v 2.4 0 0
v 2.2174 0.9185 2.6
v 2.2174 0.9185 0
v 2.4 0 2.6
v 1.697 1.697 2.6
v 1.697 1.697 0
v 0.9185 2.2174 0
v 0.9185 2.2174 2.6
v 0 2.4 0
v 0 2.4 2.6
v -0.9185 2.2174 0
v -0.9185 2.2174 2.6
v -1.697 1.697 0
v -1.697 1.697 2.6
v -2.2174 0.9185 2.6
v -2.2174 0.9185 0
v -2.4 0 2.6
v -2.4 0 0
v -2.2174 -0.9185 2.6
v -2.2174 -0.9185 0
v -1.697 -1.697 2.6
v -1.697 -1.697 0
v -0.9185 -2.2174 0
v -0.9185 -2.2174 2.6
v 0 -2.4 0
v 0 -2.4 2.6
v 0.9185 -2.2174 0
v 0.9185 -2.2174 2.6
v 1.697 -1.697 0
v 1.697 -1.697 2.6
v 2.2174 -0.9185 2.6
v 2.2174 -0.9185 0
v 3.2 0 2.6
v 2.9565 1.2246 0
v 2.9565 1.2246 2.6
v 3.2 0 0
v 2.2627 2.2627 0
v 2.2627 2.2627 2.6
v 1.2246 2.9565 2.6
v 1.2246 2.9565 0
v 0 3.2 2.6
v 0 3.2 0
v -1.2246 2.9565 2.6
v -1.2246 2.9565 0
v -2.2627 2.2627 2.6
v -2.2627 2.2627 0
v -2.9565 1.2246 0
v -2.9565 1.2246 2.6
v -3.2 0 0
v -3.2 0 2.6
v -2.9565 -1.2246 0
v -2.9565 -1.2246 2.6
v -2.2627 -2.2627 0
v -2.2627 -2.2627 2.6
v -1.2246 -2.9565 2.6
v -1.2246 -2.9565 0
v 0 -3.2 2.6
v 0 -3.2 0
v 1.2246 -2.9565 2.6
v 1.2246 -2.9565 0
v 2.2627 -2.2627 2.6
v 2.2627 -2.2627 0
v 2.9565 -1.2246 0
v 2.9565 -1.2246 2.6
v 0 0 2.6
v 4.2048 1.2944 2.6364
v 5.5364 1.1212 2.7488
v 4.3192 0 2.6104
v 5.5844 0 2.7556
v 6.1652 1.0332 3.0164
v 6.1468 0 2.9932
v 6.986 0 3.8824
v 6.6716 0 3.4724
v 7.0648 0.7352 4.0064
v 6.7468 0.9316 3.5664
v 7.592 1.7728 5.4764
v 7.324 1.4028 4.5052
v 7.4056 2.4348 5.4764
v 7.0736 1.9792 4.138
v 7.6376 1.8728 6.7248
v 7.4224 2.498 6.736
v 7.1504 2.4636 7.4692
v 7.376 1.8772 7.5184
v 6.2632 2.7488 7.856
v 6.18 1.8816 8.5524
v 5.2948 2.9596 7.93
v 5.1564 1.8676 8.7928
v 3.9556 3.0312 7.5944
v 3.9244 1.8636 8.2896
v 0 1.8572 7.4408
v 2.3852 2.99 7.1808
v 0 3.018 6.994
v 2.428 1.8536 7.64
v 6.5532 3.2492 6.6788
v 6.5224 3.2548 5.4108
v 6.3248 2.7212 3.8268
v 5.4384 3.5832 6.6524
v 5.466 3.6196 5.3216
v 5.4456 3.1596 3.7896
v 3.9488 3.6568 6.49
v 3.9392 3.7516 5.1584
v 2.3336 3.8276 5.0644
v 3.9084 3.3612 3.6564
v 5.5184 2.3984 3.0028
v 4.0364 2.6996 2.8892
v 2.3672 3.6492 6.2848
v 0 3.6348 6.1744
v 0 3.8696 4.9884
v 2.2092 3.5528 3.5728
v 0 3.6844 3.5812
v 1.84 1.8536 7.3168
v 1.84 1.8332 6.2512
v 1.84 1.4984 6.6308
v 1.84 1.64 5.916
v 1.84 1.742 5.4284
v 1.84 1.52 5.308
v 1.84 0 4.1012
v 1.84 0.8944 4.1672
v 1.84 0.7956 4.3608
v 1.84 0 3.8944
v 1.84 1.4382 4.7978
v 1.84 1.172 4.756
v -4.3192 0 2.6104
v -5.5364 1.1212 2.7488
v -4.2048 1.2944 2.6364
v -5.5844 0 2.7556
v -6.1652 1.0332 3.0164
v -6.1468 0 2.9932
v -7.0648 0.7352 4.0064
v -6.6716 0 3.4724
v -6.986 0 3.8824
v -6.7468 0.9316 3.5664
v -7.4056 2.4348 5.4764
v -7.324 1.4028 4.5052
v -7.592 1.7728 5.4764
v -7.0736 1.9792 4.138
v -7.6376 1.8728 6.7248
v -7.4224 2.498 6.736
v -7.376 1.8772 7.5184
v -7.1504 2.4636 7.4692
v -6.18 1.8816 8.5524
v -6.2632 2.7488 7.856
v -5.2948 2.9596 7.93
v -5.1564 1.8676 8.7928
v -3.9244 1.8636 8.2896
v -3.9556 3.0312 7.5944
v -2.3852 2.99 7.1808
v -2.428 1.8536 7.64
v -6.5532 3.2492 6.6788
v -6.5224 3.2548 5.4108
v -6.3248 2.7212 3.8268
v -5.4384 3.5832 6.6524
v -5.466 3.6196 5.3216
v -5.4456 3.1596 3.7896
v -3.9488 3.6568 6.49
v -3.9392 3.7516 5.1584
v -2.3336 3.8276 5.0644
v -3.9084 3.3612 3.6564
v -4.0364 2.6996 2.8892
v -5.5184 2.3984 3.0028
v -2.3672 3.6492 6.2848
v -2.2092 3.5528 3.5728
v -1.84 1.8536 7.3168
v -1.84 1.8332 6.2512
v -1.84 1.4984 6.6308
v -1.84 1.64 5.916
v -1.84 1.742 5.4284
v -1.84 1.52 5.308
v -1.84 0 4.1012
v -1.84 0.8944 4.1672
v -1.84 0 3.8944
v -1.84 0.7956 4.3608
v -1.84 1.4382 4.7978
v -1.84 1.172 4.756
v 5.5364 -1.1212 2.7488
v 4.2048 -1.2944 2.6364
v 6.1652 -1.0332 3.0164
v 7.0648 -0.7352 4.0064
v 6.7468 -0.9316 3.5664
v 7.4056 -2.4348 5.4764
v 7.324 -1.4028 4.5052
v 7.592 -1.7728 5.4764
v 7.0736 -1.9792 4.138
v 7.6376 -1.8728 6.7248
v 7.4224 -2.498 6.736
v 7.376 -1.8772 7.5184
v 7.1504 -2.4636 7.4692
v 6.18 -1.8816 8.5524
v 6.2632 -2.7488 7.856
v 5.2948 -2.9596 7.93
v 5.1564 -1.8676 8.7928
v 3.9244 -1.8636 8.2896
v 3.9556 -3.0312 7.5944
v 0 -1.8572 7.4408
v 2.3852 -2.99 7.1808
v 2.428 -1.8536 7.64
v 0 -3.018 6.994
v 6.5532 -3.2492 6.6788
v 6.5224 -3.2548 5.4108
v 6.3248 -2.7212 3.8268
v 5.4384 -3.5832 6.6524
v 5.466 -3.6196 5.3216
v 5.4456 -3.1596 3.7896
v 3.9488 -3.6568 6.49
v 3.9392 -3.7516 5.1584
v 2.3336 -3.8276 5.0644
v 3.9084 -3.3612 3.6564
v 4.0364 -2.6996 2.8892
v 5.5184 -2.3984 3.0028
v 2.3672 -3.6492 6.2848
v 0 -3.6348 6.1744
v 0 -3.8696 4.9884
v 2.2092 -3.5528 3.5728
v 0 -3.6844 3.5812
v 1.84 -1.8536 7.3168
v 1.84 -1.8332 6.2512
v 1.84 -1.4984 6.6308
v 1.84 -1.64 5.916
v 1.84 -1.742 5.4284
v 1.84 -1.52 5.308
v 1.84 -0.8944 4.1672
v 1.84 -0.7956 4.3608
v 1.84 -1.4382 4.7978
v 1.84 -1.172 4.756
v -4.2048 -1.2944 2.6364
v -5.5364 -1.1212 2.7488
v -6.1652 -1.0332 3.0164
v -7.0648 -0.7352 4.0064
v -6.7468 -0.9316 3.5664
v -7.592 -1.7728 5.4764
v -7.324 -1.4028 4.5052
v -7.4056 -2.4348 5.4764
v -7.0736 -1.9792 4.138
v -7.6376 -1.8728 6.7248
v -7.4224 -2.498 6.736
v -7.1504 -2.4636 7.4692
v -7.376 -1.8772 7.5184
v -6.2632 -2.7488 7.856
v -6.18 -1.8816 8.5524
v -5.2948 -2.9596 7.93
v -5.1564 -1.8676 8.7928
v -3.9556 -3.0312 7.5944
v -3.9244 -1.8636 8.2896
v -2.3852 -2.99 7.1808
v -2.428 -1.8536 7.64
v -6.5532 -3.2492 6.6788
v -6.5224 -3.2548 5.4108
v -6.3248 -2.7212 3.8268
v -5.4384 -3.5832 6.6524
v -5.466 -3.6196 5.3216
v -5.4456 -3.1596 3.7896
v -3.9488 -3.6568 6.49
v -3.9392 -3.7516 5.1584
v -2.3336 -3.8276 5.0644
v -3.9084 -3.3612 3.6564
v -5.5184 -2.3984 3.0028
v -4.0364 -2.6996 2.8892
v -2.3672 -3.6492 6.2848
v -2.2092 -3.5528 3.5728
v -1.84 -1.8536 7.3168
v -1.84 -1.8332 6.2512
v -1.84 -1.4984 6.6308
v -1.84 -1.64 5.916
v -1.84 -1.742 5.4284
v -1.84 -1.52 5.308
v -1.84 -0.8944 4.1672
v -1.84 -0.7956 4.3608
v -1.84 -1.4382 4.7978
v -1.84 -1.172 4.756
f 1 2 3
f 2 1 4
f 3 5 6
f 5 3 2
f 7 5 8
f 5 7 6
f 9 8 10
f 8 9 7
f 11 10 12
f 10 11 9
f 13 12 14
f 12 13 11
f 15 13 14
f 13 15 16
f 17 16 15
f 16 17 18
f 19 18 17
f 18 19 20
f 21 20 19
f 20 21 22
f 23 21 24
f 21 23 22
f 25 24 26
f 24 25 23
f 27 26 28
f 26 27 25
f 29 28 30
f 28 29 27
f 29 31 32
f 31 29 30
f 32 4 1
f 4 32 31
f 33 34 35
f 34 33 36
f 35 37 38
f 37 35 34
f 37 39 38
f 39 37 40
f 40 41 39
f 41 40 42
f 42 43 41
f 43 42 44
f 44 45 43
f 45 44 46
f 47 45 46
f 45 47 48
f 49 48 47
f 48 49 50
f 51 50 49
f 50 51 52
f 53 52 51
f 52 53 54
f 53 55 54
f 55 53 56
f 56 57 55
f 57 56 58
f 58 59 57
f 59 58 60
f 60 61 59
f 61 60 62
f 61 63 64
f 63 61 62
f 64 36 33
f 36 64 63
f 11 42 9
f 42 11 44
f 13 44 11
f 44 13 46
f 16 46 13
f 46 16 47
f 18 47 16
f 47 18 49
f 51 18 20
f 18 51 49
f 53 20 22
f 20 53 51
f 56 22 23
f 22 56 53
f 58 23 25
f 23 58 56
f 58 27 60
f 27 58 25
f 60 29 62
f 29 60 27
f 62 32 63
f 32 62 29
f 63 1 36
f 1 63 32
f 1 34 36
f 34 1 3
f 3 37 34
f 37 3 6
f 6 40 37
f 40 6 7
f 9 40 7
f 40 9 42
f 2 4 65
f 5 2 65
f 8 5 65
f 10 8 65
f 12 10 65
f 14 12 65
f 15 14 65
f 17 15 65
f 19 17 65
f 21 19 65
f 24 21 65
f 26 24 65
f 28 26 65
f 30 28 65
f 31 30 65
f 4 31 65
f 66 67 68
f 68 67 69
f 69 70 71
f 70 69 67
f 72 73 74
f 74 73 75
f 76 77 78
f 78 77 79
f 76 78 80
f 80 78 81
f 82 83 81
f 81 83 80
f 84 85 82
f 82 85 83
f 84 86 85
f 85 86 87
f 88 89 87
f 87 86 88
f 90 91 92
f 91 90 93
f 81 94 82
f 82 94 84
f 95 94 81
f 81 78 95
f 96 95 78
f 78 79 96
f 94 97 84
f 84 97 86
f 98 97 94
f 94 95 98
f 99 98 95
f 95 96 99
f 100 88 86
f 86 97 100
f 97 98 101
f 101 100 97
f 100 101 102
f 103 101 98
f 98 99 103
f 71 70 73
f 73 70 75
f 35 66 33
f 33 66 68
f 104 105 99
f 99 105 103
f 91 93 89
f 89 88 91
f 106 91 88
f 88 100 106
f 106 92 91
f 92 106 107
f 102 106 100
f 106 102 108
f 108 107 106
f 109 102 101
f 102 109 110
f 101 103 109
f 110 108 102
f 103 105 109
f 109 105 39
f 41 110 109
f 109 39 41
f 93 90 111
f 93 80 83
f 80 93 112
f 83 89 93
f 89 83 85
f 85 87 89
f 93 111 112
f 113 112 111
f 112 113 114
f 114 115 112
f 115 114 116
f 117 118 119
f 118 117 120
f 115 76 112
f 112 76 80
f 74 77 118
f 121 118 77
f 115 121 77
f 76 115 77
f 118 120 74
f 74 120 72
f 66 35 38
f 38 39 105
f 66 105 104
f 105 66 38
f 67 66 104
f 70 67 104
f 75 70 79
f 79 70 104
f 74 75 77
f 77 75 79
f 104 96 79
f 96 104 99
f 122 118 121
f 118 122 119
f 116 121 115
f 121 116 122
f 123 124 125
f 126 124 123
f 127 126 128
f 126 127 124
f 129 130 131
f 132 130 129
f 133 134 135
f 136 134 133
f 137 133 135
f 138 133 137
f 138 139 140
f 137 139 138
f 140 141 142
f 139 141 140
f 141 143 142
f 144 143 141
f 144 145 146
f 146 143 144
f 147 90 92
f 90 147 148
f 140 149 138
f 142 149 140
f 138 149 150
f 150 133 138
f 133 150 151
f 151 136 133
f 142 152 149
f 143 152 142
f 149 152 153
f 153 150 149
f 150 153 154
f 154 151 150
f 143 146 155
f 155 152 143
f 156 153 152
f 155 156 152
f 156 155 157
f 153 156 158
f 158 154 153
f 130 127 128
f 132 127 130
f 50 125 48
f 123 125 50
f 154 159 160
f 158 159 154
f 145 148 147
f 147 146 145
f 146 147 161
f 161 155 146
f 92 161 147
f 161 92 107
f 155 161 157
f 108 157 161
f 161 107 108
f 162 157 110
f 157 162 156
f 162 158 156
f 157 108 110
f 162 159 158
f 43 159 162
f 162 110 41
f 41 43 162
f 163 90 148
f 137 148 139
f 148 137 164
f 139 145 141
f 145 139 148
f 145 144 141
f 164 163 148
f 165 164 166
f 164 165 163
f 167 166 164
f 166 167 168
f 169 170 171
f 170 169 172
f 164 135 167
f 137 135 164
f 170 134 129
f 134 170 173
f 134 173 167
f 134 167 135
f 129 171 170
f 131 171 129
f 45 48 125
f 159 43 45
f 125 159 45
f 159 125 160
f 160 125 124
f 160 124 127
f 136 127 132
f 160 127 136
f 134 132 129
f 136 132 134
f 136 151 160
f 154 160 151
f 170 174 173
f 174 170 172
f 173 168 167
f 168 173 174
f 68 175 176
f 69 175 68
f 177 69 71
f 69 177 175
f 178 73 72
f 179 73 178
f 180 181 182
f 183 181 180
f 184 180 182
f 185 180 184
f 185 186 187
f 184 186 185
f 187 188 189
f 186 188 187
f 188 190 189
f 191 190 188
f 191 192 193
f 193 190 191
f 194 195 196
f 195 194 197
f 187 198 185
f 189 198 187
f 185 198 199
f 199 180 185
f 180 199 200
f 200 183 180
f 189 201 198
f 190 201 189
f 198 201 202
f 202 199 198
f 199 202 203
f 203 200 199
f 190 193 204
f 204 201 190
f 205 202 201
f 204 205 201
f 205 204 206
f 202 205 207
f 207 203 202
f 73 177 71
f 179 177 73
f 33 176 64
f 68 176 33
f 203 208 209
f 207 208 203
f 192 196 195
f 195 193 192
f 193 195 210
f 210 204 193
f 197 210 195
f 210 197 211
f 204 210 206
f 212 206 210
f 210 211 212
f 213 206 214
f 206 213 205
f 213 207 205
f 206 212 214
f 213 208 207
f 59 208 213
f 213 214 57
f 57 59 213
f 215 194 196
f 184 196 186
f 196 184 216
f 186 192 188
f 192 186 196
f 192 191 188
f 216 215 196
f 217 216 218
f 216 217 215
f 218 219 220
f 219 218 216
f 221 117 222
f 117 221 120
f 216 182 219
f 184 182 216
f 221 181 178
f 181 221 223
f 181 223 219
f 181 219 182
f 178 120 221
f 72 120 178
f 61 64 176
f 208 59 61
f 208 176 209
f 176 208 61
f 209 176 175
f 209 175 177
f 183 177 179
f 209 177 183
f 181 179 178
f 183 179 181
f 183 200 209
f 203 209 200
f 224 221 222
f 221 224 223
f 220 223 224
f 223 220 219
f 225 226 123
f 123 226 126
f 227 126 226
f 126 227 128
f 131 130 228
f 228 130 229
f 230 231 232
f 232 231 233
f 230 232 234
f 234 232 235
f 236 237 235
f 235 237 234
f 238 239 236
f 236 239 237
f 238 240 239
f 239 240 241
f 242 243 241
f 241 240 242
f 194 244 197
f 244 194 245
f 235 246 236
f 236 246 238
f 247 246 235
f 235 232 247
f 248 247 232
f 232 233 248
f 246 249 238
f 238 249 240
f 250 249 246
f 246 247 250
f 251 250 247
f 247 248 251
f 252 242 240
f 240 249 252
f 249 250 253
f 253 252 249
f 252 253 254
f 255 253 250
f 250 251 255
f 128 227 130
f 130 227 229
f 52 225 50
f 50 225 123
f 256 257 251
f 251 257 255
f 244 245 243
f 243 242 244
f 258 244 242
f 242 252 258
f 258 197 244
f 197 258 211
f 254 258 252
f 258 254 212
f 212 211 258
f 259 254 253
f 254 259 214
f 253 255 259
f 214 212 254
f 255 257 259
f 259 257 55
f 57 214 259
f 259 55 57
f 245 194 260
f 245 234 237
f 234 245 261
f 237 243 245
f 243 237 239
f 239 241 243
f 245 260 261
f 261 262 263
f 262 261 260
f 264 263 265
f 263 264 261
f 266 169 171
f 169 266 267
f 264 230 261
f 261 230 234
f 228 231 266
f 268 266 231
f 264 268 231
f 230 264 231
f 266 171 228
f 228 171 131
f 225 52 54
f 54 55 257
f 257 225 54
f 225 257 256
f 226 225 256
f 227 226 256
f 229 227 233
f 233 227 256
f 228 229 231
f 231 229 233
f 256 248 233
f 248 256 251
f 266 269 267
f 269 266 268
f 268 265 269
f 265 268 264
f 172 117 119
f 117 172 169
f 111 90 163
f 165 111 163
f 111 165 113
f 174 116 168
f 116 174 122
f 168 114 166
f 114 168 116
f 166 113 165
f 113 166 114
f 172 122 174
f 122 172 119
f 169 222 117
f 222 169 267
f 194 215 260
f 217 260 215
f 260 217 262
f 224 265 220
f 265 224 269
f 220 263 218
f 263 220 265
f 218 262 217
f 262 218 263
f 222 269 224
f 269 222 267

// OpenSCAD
// file: ../p/4-4ring3.scad
use <../lib.scad>
function ldraw_lib__4_4ring3() = [
// 0 Ring  3 x 1.0
// 0 Name: 4-4ring3.dat
// 0 Author: James Jessiman
// 0 !LDRAW_ORG Primitive UPDATE 2009-01
// 0 !LICENSE Licensed under CC BY 2.0 and CC BY 4.0 : see CAreadme.txt
// 
// 0 BFC CERTIFY CCW
  [0,"BFC","CERTIFY"],
  [0,"BFC","CCW"],
// 
// 0 !HISTORY 1998-12-15 [PTadmin] Official Update 1998-10
// 0 !HISTORY 2002-04-05 [hafhead] Added BFC statement
// 0 !HISTORY 2002-04-25 [PTadmin] Official Update 2002-02
// 0 !HISTORY 2007-06-24 [PTadmin] Header formatted for Contributor Agreement
// 0 !HISTORY 2008-07-01 [PTadmin] Official Update 2008-01
// 0 !HISTORY 2008-08-26 [cwdee] Switch polygon winding and rename
// 0 !HISTORY 2009-05-02 [PTadmin] Official Update 2009-01
// 
// 
// 4 16 -1.5308 0 3.6956 -1.1481 0 2.7717 0 0 3 0 0 4
  [4,16,-1.5308,0,3.6956,-1.1481,0,2.7717,0,0,3,0,0,4],
// 4 16 -2.8284 0 2.8284 -2.1213 0 2.1213 -1.1481 0 2.7717 -1.5308 0 3.6956
  [4,16,-2.8284,0,2.8284,-2.1213,0,2.1213,-1.1481,0,2.7717,-1.5308,0,3.6956],
// 4 16 -3.6956 0 1.5308 -2.7717 0 1.1481 -2.1213 0 2.1213 -2.8284 0 2.8284
  [4,16,-3.6956,0,1.5308,-2.7717,0,1.1481,-2.1213,0,2.1213,-2.8284,0,2.8284],
// 4 16 -4 0 0 -3 0 0 -2.7717 0 1.1481 -3.6956 0 1.5308
  [4,16,-4,0,0,-3,0,0,-2.7717,0,1.1481,-3.6956,0,1.5308],
// 4 16 -3.6956 0 -1.5308 -2.7717 0 -1.1481 -3 0 0 -4 0 0
  [4,16,-3.6956,0,-1.5308,-2.7717,0,-1.1481,-3,0,0,-4,0,0],
// 4 16 -2.8284 0 -2.8284 -2.1213 0 -2.1213 -2.7717 0 -1.1481 -3.6956 0 -1.5308
  [4,16,-2.8284,0,-2.8284,-2.1213,0,-2.1213,-2.7717,0,-1.1481,-3.6956,0,-1.5308],
// 4 16 -1.5308 0 -3.6956 -1.1481 0 -2.7717 -2.1213 0 -2.1213 -2.8284 0 -2.8284
  [4,16,-1.5308,0,-3.6956,-1.1481,0,-2.7717,-2.1213,0,-2.1213,-2.8284,0,-2.8284],
// 4 16 0 0 -4 0 0 -3 -1.1481 0 -2.7717 -1.5308 0 -3.6956
  [4,16,0,0,-4,0,0,-3,-1.1481,0,-2.7717,-1.5308,0,-3.6956],
// 4 16 1.5308 0 -3.6956 1.1481 0 -2.7717 0 0 -3 0 0 -4
  [4,16,1.5308,0,-3.6956,1.1481,0,-2.7717,0,0,-3,0,0,-4],
// 4 16 2.8284 0 -2.8284 2.1213 0 -2.1213 1.1481 0 -2.7717 1.5308 0 -3.6956
  [4,16,2.8284,0,-2.8284,2.1213,0,-2.1213,1.1481,0,-2.7717,1.5308,0,-3.6956],
// 4 16 3.6956 0 -1.5308 2.7717 0 -1.1481 2.1213 0 -2.1213 2.8284 0 -2.8284
  [4,16,3.6956,0,-1.5308,2.7717,0,-1.1481,2.1213,0,-2.1213,2.8284,0,-2.8284],
// 4 16 4 0 0 3 0 0 2.7717 0 -1.1481 3.6956 0 -1.5308
  [4,16,4,0,0,3,0,0,2.7717,0,-1.1481,3.6956,0,-1.5308],
// 4 16 3.6956 0 1.5308 2.7717 0 1.1481 3 0 0 4 0 0
  [4,16,3.6956,0,1.5308,2.7717,0,1.1481,3,0,0,4,0,0],
// 4 16 2.8284 0 2.8284 2.1213 0 2.1213 2.7717 0 1.1481 3.6956 0 1.5308
  [4,16,2.8284,0,2.8284,2.1213,0,2.1213,2.7717,0,1.1481,3.6956,0,1.5308],
// 4 16 1.5308 0 3.6956 1.1481 0 2.7717 2.1213 0 2.1213 2.8284 0 2.8284
  [4,16,1.5308,0,3.6956,1.1481,0,2.7717,2.1213,0,2.1213,2.8284,0,2.8284],
// 4 16 0 0 4 0 0 3 1.1481 0 2.7717 1.5308 0 3.6956
  [4,16,0,0,4,0,0,3,1.1481,0,2.7717,1.5308,0,3.6956],
// 0
];
makepoly(ldraw_lib__4_4ring3(), line=0.2);
// file: ../p/4-4edge.scad
use <../lib.scad>
function ldraw_lib__4_4edge() = [
// 0 Circle 1.0
// 0 Name: 4-4edge.dat
// 0 Author: James Jessiman
// 0 !LDRAW_ORG Primitive UPDATE 2017-01
// 0 !LICENSE Licensed under CC BY 2.0 and CC BY 4.0 : see CAreadme.txt
// 
// 0 BFC CERTIFY CCW
  [0,"BFC","CERTIFY"],
  [0,"BFC","CCW"],
// 
// 0 !HISTORY 1998-12-15 [PTadmin] Official Update 1998-10
// 0 !HISTORY 2005-12-28 [PTadmin] Official Update 2005-01
// 0 !HISTORY 2007-06-24 [PTadmin] Header formatted for Contributor Agreement
// 0 !HISTORY 2008-07-01 [PTadmin] Official Update 2008-01
// 0 !HISTORY 2017-01-15 [Steffen] BFCed
// 0 !HISTORY 2017-12-30 [PTadmin] Official Update 2017-01
// 
// 
// 2 24 1 0 0 0.9239 0 0.3827
  [2,24,1,0,0,0.9239,0,0.3827],
// 2 24 0.9239 0 0.3827 0.7071 0 0.7071
  [2,24,0.9239,0,0.3827,0.7071,0,0.7071],
// 2 24 0.7071 0 0.7071 0.3827 0 0.9239
  [2,24,0.7071,0,0.7071,0.3827,0,0.9239],
// 2 24 0.3827 0 0.9239 0 0 1
  [2,24,0.3827,0,0.9239,0,0,1],
// 2 24 0 0 1 -0.3827 0 0.9239
  [2,24,0,0,1,-0.3827,0,0.9239],
// 2 24 -0.3827 0 0.9239 -0.7071 0 0.7071
  [2,24,-0.3827,0,0.9239,-0.7071,0,0.7071],
// 2 24 -0.7071 0 0.7071 -0.9239 0 0.3827
  [2,24,-0.7071,0,0.7071,-0.9239,0,0.3827],
// 2 24 -0.9239 0 0.3827 -1 0 -0
  [2,24,-0.9239,0,0.3827,-1,0,-0],
// 2 24 -1 0 -0 -0.9239 0 -0.3827
  [2,24,-1,0,-0,-0.9239,0,-0.3827],
// 2 24 -0.9239 0 -0.3827 -0.7071 0 -0.7071
  [2,24,-0.9239,0,-0.3827,-0.7071,0,-0.7071],
// 2 24 -0.7071 0 -0.7071 -0.3827 0 -0.9239
  [2,24,-0.7071,0,-0.7071,-0.3827,0,-0.9239],
// 2 24 -0.3827 0 -0.9239 0 0 -1
  [2,24,-0.3827,0,-0.9239,0,0,-1],
// 2 24 0 0 -1 0.3827 0 -0.9239
  [2,24,0,0,-1,0.3827,0,-0.9239],
// 2 24 0.3827 0 -0.9239 0.7071 0 -0.7071
  [2,24,0.3827,0,-0.9239,0.7071,0,-0.7071],
// 2 24 0.7071 0 -0.7071 0.9239 0 -0.3827
  [2,24,0.7071,0,-0.7071,0.9239,0,-0.3827],
// 2 24 0.9239 0 -0.3827 1 0 0
  [2,24,0.9239,0,-0.3827,1,0,0],
];
makepoly(ldraw_lib__4_4edge(), line=0.2);
// file: ../p/4-4cyli.scad
use <../lib.scad>
function ldraw_lib__4_4cyli() = [
// 0 Cylinder 1.0
// 0 Name: 4-4cyli.dat
// 0 Author: James Jessiman
// 0 !LDRAW_ORG Primitive UPDATE 2005-01
// 0 !LICENSE Licensed under CC BY 2.0 and CC BY 4.0 : see CAreadme.txt
// 
// 0 BFC CERTIFY CCW
  [0,"BFC","CERTIFY"],
  [0,"BFC","CCW"],
// 
// 0 !HISTORY 1998-12-15 [PTadmin] Official Update 1998-10
// 0 !HISTORY 2002-03-23 [sbliss] Added BFC statement; merged headers from files in distributions LDraw 0.27 and Complete.
// 0 !HISTORY 2002-04-25 [PTadmin] Official Update 2002-02
// 0 !HISTORY 2004-12-14 [guyvivan] BFC CCW
// 0 !HISTORY 2005-12-28 [PTadmin] Official Update 2005-01
// 0 !HISTORY 2007-06-24 [PTadmin] Header formatted for Contributor Agreement
// 0 !HISTORY 2008-07-01 [PTadmin] Official Update 2008-01
// 
// 
// 4 16 1 1 0 0.9239 1 0.3827 0.9239 0 0.3827 1 0 0
  [4,16,1,1,0,0.9239,1,0.3827,0.9239,0,0.3827,1,0,0],
// 5 24 1 0 0 1 1 0 0.9239 0 0.3827 0.9239 0 -0.3827
  [5,24,1,0,0,1,1,0,0.9239,0,0.3827,0.9239,0,-0.3827],
// 4 16 0.9239 1 0.3827 0.7071 1 0.7071 0.7071 0 0.7071 0.9239 0 0.3827
  [4,16,0.9239,1,0.3827,0.7071,1,0.7071,0.7071,0,0.7071,0.9239,0,0.3827],
// 5 24 0.9239 0 0.3827 0.9239 1 0.3827 0.7071 0 0.7071 1 0 0
  [5,24,0.9239,0,0.3827,0.9239,1,0.3827,0.7071,0,0.7071,1,0,0],
// 4 16 0.7071 1 0.7071 0.3827 1 0.9239 0.3827 0 0.9239 0.7071 0 0.7071
  [4,16,0.7071,1,0.7071,0.3827,1,0.9239,0.3827,0,0.9239,0.7071,0,0.7071],
// 5 24 0.7071 0 0.7071 0.7071 1 0.7071 0.3827 0 0.9239 0.9239 0 0.3827
  [5,24,0.7071,0,0.7071,0.7071,1,0.7071,0.3827,0,0.9239,0.9239,0,0.3827],
// 4 16 0.3827 1 0.9239 0 1 1 0 0 1 0.3827 0 0.9239
  [4,16,0.3827,1,0.9239,0,1,1,0,0,1,0.3827,0,0.9239],
// 5 24 0.3827 0 0.9239 0.3827 1 0.9239 0 0 1 0.7071 0 0.7071
  [5,24,0.3827,0,0.9239,0.3827,1,0.9239,0,0,1,0.7071,0,0.7071],
// 4 16 0 1 1 -0.3827 1 0.9239 -0.3827 0 0.9239 0 0 1
  [4,16,0,1,1,-0.3827,1,0.9239,-0.3827,0,0.9239,0,0,1],
// 5 24 0 0 1 0 1 1 -0.3827 0 0.9239 0.3827 0 0.9239
  [5,24,0,0,1,0,1,1,-0.3827,0,0.9239,0.3827,0,0.9239],
// 4 16 -0.3827 1 0.9239 -0.7071 1 0.7071 -0.7071 0 0.7071 -0.3827 0 0.9239
  [4,16,-0.3827,1,0.9239,-0.7071,1,0.7071,-0.7071,0,0.7071,-0.3827,0,0.9239],
// 5 24 -0.3827 0 0.9239 -0.3827 1 0.9239 -0.7071 0 0.7071 0 0 1
  [5,24,-0.3827,0,0.9239,-0.3827,1,0.9239,-0.7071,0,0.7071,0,0,1],
// 4 16 -0.7071 1 0.7071 -0.9239 1 0.3827 -0.9239 0 0.3827 -0.7071 0 0.7071
  [4,16,-0.7071,1,0.7071,-0.9239,1,0.3827,-0.9239,0,0.3827,-0.7071,0,0.7071],
// 5 24 -0.7071 0 0.7071 -0.7071 1 0.7071 -0.9239 0 0.3827 -0.3827 0 0.9239
  [5,24,-0.7071,0,0.7071,-0.7071,1,0.7071,-0.9239,0,0.3827,-0.3827,0,0.9239],
// 4 16 -0.9239 1 0.3827 -1 1 0 -1 0 0 -0.9239 0 0.3827
  [4,16,-0.9239,1,0.3827,-1,1,0,-1,0,0,-0.9239,0,0.3827],
// 5 24 -0.9239 0 0.3827 -0.9239 1 0.3827 -1 0 0 -0.7071 0 0.7071
  [5,24,-0.9239,0,0.3827,-0.9239,1,0.3827,-1,0,0,-0.7071,0,0.7071],
// 4 16 -1 1 0 -0.9239 1 -0.3827 -0.9239 0 -0.3827 -1 0 0
  [4,16,-1,1,0,-0.9239,1,-0.3827,-0.9239,0,-0.3827,-1,0,0],
// 5 24 -1 0 0 -1 1 0 -0.9239 0 -0.3827 -0.9239 0 0.3827
  [5,24,-1,0,0,-1,1,0,-0.9239,0,-0.3827,-0.9239,0,0.3827],
// 4 16 -0.9239 1 -0.3827 -0.7071 1 -0.7071 -0.7071 0 -0.7071 -0.9239 0 -0.3827
  [4,16,-0.9239,1,-0.3827,-0.7071,1,-0.7071,-0.7071,0,-0.7071,-0.9239,0,-0.3827],
// 5 24 -0.9239 0 -0.3827 -0.9239 1 -0.3827 -0.7071 0 -0.7071 -1 0 0
  [5,24,-0.9239,0,-0.3827,-0.9239,1,-0.3827,-0.7071,0,-0.7071,-1,0,0],
// 4 16 -0.7071 1 -0.7071 -0.3827 1 -0.9239 -0.3827 0 -0.9239 -0.7071 0 -0.7071
  [4,16,-0.7071,1,-0.7071,-0.3827,1,-0.9239,-0.3827,0,-0.9239,-0.7071,0,-0.7071],
// 5 24 -0.7071 0 -0.7071 -0.7071 1 -0.7071 -0.3827 0 -0.9239 -0.9239 0 -0.3827
  [5,24,-0.7071,0,-0.7071,-0.7071,1,-0.7071,-0.3827,0,-0.9239,-0.9239,0,-0.3827],
// 4 16 -0.3827 1 -0.9239 0 1 -1 0 0 -1 -0.3827 0 -0.9239
  [4,16,-0.3827,1,-0.9239,0,1,-1,0,0,-1,-0.3827,0,-0.9239],
// 5 24 -0.3827 0 -0.9239 -0.3827 1 -0.9239 0 0 -1 -0.7071 0 -0.7071
  [5,24,-0.3827,0,-0.9239,-0.3827,1,-0.9239,0,0,-1,-0.7071,0,-0.7071],
// 4 16 0 1 -1 0.3827 1 -0.9239 0.3827 0 -0.9239 0 0 -1
  [4,16,0,1,-1,0.3827,1,-0.9239,0.3827,0,-0.9239,0,0,-1],
// 5 24 0 0 -1 0 1 -1 0.3827 0 -0.9239 -0.3827 0 -0.9239
  [5,24,0,0,-1,0,1,-1,0.3827,0,-0.9239,-0.3827,0,-0.9239],
// 4 16 0.3827 1 -0.9239 0.7071 1 -0.7071 0.7071 0 -0.7071 0.3827 0 -0.9239
  [4,16,0.3827,1,-0.9239,0.7071,1,-0.7071,0.7071,0,-0.7071,0.3827,0,-0.9239],
// 5 24 0.3827 0 -0.9239 0.3827 1 -0.9239 0.7071 0 -0.7071 0 0 -1
  [5,24,0.3827,0,-0.9239,0.3827,1,-0.9239,0.7071,0,-0.7071,0,0,-1],
// 4 16 0.7071 1 -0.7071 0.9239 1 -0.3827 0.9239 0 -0.3827 0.7071 0 -0.7071
  [4,16,0.7071,1,-0.7071,0.9239,1,-0.3827,0.9239,0,-0.3827,0.7071,0,-0.7071],
// 5 24 0.7071 0 -0.7071 0.7071 1 -0.7071 0.9239 0 -0.3827 0.3827 0 -0.9239
  [5,24,0.7071,0,-0.7071,0.7071,1,-0.7071,0.9239,0,-0.3827,0.3827,0,-0.9239],
// 4 16 0.9239 1 -0.3827 1 1 0 1 0 0 0.9239 0 -0.3827
  [4,16,0.9239,1,-0.3827,1,1,0,1,0,0,0.9239,0,-0.3827],
// 5 24 0.9239 0 -0.3827 0.9239 1 -0.3827 1 0 0 0.7071 0 -0.7071
  [5,24,0.9239,0,-0.3827,0.9239,1,-0.3827,1,0,0,0.7071,0,-0.7071],
// 0
];
makepoly(ldraw_lib__4_4cyli(), line=0.2);
// file: ../p/stud4.scad
use <../lib.scad>
use <4-4cyli.scad>
use <4-4edge.scad>
use <4-4ring3.scad>
function ldraw_lib__stud4() = [
// 0 Stud Tube Open
// 0 Name: stud4.dat
// 0 Author: James Jessiman
// 0 !LDRAW_ORG Primitive UPDATE 2009-02
// 0 !LICENSE Licensed under CC BY 2.0 and CC BY 4.0 : see CAreadme.txt
// 
// 0 BFC CERTIFY CCW
  [0,"BFC","CERTIFY"],
  [0,"BFC","CCW"],
// 
// 0 !HISTORY 1999-07-05 [PTadmin] Official Update 1999-05
// 0 !HISTORY 2002-04-04 [sbliss] Modified for BFC compliance
// 0 !HISTORY 2002-04-25 [PTadmin] Official Update 2002-02
// 0 !HISTORY 2007-06-24 [PTadmin] Header formatted for Contributor Agreement
// 0 !HISTORY 2008-07-01 [PTadmin] Official Update 2008-01
// 0 !HISTORY 2009-06-21 [cwdee] Update ring references to 4-4ring
// 0 !HISTORY 2009-09-03 [PTadmin] Official Update 2009-02
// 
// 
// 1 16 0 -4 0 6 0 0 0 1 0 0 0 6 4-4edge.dat
  [1,16,0,-4,0,6,0,0,0,1,0,0,0,6, ldraw_lib__4_4edge()],
// 1 16 0 -4 0 8 0 0 0 1 0 0 0 8 4-4edge.dat
  [1,16,0,-4,0,8,0,0,0,1,0,0,0,8, ldraw_lib__4_4edge()],
// 1 16 0 0 0 6 0 0 0 1 0 0 0 6 4-4edge.dat
  [1,16,0,0,0,6,0,0,0,1,0,0,0,6, ldraw_lib__4_4edge()],
// 1 16 0 0 0 8 0 0 0 1 0 0 0 8 4-4edge.dat
  [1,16,0,0,0,8,0,0,0,1,0,0,0,8, ldraw_lib__4_4edge()],
// 0 BFC INVERTNEXT
  [0,"BFC","INVERTNEXT"],
// 1 16 0 -4 0 6 0 0 0 4 0 0 0 6 4-4cyli.dat
  [1,16,0,-4,0,6,0,0,0,4,0,0,0,6, ldraw_lib__4_4cyli()],
// 1 16 0 -4 0 8 0 0 0 4 0 0 0 8 4-4cyli.dat
  [1,16,0,-4,0,8,0,0,0,4,0,0,0,8, ldraw_lib__4_4cyli()],
// 1 16 0 -4 0 2 0 0 0 1 0 0 0 2 4-4ring3.dat
  [1,16,0,-4,0,2,0,0,0,1,0,0,0,2, ldraw_lib__4_4ring3()],
// 0
];
makepoly(ldraw_lib__stud4(), line=0.2);
// file: ../p/rect2p.scad
use <../lib.scad>
function ldraw_lib__rect2p() = [
// 0 Rectangle with 2 Parallel Edges
// 0 Name: rect2p.dat
// 0 Author: Donald Sutter [technog]
// 0 !LDRAW_ORG Primitive UPDATE 2010-01
// 0 !LICENSE Licensed under CC BY 2.0 and CC BY 4.0 : see CAreadme.txt
// 
// 0 BFC CERTIFY CCW
  [0,"BFC","CERTIFY"],
  [0,"BFC","CCW"],
// 
// 0 !HISTORY 2003-08-01 [PTadmin] Official Update 2003-02
// 0 !HISTORY 2007-06-24 [PTadmin] Header formatted for Contributor Agreement
// 0 !HISTORY 2008-07-01 [PTadmin] Official Update 2008-01
// 0 !HISTORY 2010-01-17 [mikeheide] changed winding to CCW
// 0 !HISTORY 2010-04-05 [PTadmin] Official Update 2010-01
// 
// 
// 2 24 1 0 1 -1 0 1
  [2,24,1,0,1,-1,0,1],
// 2 24 -1 0 -1 1 0 -1
  [2,24,-1,0,-1,1,0,-1],
// 4 16 -1 0 1 -1 0 -1 1 0 -1 1 0 1
  [4,16,-1,0,1,-1,0,-1,1,0,-1,1,0,1],
// 0
];
makepoly(ldraw_lib__rect2p(), line=0.2);
// file: ../p/4-4disc.scad
use <../lib.scad>
function ldraw_lib__4_4disc() = [
// 0 Disc 1.0
// 0 Name: 4-4disc.dat
// 0 Author: James Jessiman
// 0 !LDRAW_ORG Primitive UPDATE 2002-02
// 0 !LICENSE Licensed under CC BY 2.0 and CC BY 4.0 : see CAreadme.txt
// 
// 0 BFC CERTIFY CCW
  [0,"BFC","CERTIFY"],
  [0,"BFC","CCW"],
// 
// 0 !HISTORY 1998-12-15 [PTadmin] Official Update 1998-10
// 0 !HISTORY 2002-03-23 [sbliss] Added BFC statement
// 0 !HISTORY 2002-04-25 [PTadmin] Official Update 2002-02
// 0 !HISTORY 2007-06-24 [PTadmin] Header formatted for Contributor Agreement
// 0 !HISTORY 2008-07-01 [PTadmin] Official Update 2008-01
// 
// 
// 3 16 0 0 0 1 0 0 0.9239 0 0.3827
  [3,16,0,0,0,1,0,0,0.9239,0,0.3827],
// 3 16 0 0 0 0.9239 0 0.3827 0.7071 0 0.7071
  [3,16,0,0,0,0.9239,0,0.3827,0.7071,0,0.7071],
// 3 16 0 0 0 0.7071 0 0.7071 0.3827 0 0.9239
  [3,16,0,0,0,0.7071,0,0.7071,0.3827,0,0.9239],
// 3 16 0 0 0 0.3827 0 0.9239 0 0 1
  [3,16,0,0,0,0.3827,0,0.9239,0,0,1],
// 3 16 0 0 0 0 0 1 -0.3827 0 0.9239
  [3,16,0,0,0,0,0,1,-0.3827,0,0.9239],
// 3 16 0 0 0 -0.3827 0 0.9239 -0.7071 0 0.7071
  [3,16,0,0,0,-0.3827,0,0.9239,-0.7071,0,0.7071],
// 3 16 0 0 0 -0.7071 0 0.7071 -0.9239 0 0.3827
  [3,16,0,0,0,-0.7071,0,0.7071,-0.9239,0,0.3827],
// 3 16 0 0 0 -0.9239 0 0.3827 -1 0 -0
  [3,16,0,0,0,-0.9239,0,0.3827,-1,0,-0],
// 3 16 0 0 0 -1 0 -0 -0.9239 0 -0.3827
  [3,16,0,0,0,-1,0,-0,-0.9239,0,-0.3827],
// 3 16 0 0 0 -0.9239 0 -0.3827 -0.7071 0 -0.7071
  [3,16,0,0,0,-0.9239,0,-0.3827,-0.7071,0,-0.7071],
// 3 16 0 0 0 -0.7071 0 -0.7071 -0.3827 0 -0.9239
  [3,16,0,0,0,-0.7071,0,-0.7071,-0.3827,0,-0.9239],
// 3 16 0 0 0 -0.3827 0 -0.9239 0 0 -1
  [3,16,0,0,0,-0.3827,0,-0.9239,0,0,-1],
// 3 16 0 0 0 0 0 -1 0.3827 0 -0.9239
  [3,16,0,0,0,0,0,-1,0.3827,0,-0.9239],
// 3 16 0 0 0 0.3827 0 -0.9239 0.7071 0 -0.7071
  [3,16,0,0,0,0.3827,0,-0.9239,0.7071,0,-0.7071],
// 3 16 0 0 0 0.7071 0 -0.7071 0.9239 0 -0.3827
  [3,16,0,0,0,0.7071,0,-0.7071,0.9239,0,-0.3827],
// 3 16 0 0 0 0.9239 0 -0.3827 1 0 0
  [3,16,0,0,0,0.9239,0,-0.3827,1,0,0],
// 0
];
makepoly(ldraw_lib__4_4disc(), line=0.2);
// main file
use <../lib.scad>
use <../p/4-4disc.scad>
use <../p/rect2p.scad>
use <s/25386s01.scad>
use <../p/stud4.scad>
function ldraw_lib__25386() = [
// 0 Minifig Food Bread Bun
// 0 Name: 25386.dat
// 0 Author: Philippe Hurbain [Philo]
// 0 !LDRAW_ORG Part UPDATE 2018-02
// 0 !LICENSE Licensed under CC BY 2.0 and CC BY 4.0 : see CAreadme.txt
// 
// 0 !HELP Sausage: 1 4 0 -14.5 0 1 0 0 0 0 1 0 -1 0 33078.dat
// 
// 0 BFC CERTIFY CCW
  [0,"BFC","CERTIFY"],
  [0,"BFC","CCW"],
// 
// 0 !CATEGORY Minifig Accessory
// 0 !KEYWORDS Hot Dog, Sausage
// 
// 0 !HISTORY 2018-01-09 {LEGO Digital Designer} Original part shape
// 0 !HISTORY 2018-01-22 [Philo] File preparation for LDraw Parts Tracker
// 0 !HISTORY 2018-12-08 [PTadmin] Official Update 2018-02
// 
// 
// 1 16 0 -6.5 0 1 0 0 0 -1.625 0 0 0 1 stud4.dat
  [1,16,0,-6.5,0,1,0,0,0,-1.625,0,0,0,1, ldraw_lib__stud4()],
// 1 16 0 -6.5 0 6 0 0 0 -1 0 0 0 6 4-4disc.dat
  [1,16,0,-6.5,0,6,0,0,0,-1,0,0,0,6, ldraw_lib__4_4disc()],
// 
// 1 16 0 0 0 1 0 0 0 1 0 0 0 1 s\25386s01.dat
  [1,16,0,0,0,1,0,0,0,1,0,0,0,1, ldraw_lib__s__25386s01()],
// 1 16 0 0 0 -1 0 0 0 1 0 0 0 1 s\25386s01.dat
  [1,16,0,0,0,-1,0,0,0,1,0,0,0,1, ldraw_lib__s__25386s01()],
// 1 16 0 0 0 1 0 0 0 1 0 0 0 -1 s\25386s01.dat
  [1,16,0,0,0,1,0,0,0,1,0,0,0,-1, ldraw_lib__s__25386s01()],
// 1 16 0 0 0 -1 0 0 0 1 0 0 0 -1 s\25386s01.dat
  [1,16,0,0,0,-1,0,0,0,1,0,0,0,-1, ldraw_lib__s__25386s01()],
// 
// 4 16 4.6 -10.253 0 4.6 -10.902 1.989 -4.6 -10.902 1.989 -4.6 -10.253 0
  [4,16,4.6,-10.253,0,4.6,-10.902,1.989,-4.6,-10.902,1.989,-4.6,-10.253,0],
// 3 16 4.6 -18.292 4.634 0 -18.602 4.643 -4.6 -18.292 4.634
  [3,16,4.6,-18.292,4.634,0,-18.602,4.643,-4.6,-18.292,4.634],
// 1 16 0 -17.4345 4.19 4.6 0 0 0 0 -0.8575 0 1 0.444 rect2p.dat
  [1,16,0,-17.4345,4.19,4.6,0,0,0,0,-0.8575,0,1,0.444, ldraw_lib__rect2p()],
// 4 16 4.6 -13.27 3.8 -4.6 -13.27 3.8 -4.6 -11.89 2.93 4.6 -11.89 2.93
  [4,16,4.6,-13.27,3.8,-4.6,-13.27,3.8,-4.6,-11.89,2.93,4.6,-11.89,2.93],
// 4 16 4.6 -14.79 4.1 -4.6 -14.79 4.1 -4.6 -13.27 3.8 4.6 -13.27 3.8
  [4,16,4.6,-14.79,4.1,-4.6,-14.79,4.1,-4.6,-13.27,3.8,4.6,-13.27,3.8],
// 4 16 4.6 -16.577 3.746 -4.6 -16.577 3.746 -4.6 -14.79 4.1 4.6 -14.79 4.1
  [4,16,4.6,-16.577,3.746,-4.6,-16.577,3.746,-4.6,-14.79,4.1,4.6,-14.79,4.1],
// 4 16 4.6 -10.902 1.989 4.6 -11.89 2.93 -4.6 -11.89 2.93 -4.6 -10.902 1.989
  [4,16,4.6,-10.902,1.989,4.6,-11.89,2.93,-4.6,-11.89,2.93,-4.6,-10.902,1.989],
// 4 16 -4.6 -10.902 -1.989 4.6 -10.902 -1.989 4.6 -10.253 0 -4.6 -10.253 0
  [4,16,-4.6,-10.902,-1.989,4.6,-10.902,-1.989,4.6,-10.253,0,-4.6,-10.253,0],
// 3 16 0 -18.602 -4.643 4.6 -18.292 -4.634 -4.6 -18.292 -4.634
  [3,16,0,-18.602,-4.643,4.6,-18.292,-4.634,-4.6,-18.292,-4.634],
// 1 16 0 -17.4345 -4.19 -4.6 0 0 0 0 -0.8575 0 -1 -0.444 rect2p.dat
  [1,16,0,-17.4345,-4.19,-4.6,0,0,0,0,-0.8575,0,-1,-0.444, ldraw_lib__rect2p()],
// 4 16 -4.6 -11.89 -2.93 -4.6 -13.27 -3.8 4.6 -13.27 -3.8 4.6 -11.89 -2.93
  [4,16,-4.6,-11.89,-2.93,-4.6,-13.27,-3.8,4.6,-13.27,-3.8,4.6,-11.89,-2.93],
// 4 16 -4.6 -13.27 -3.8 -4.6 -14.79 -4.1 4.6 -14.79 -4.1 4.6 -13.27 -3.8
  [4,16,-4.6,-13.27,-3.8,-4.6,-14.79,-4.1,4.6,-14.79,-4.1,4.6,-13.27,-3.8],
// 4 16 -4.6 -14.79 -4.1 -4.6 -16.577 -3.746 4.6 -16.577 -3.746 4.6 -14.79 -4.1
  [4,16,-4.6,-14.79,-4.1,-4.6,-16.577,-3.746,4.6,-16.577,-3.746,4.6,-14.79,-4.1],
// 4 16 -4.6 -11.89 -2.93 4.6 -11.89 -2.93 4.6 -10.902 -1.989 -4.6 -10.902 -1.989
  [4,16,-4.6,-11.89,-2.93,4.6,-11.89,-2.93,4.6,-10.902,-1.989,-4.6,-10.902,-1.989],
// 5 24 -16.679 -8.681 0 -15.367 -7.483 0 -15.413 -7.541 2.583 -15.413 -7.541 -2.583
  [5,24,-16.679,-8.681,0,-15.367,-7.483,0,-15.413,-7.541,2.583,-15.413,-7.541,-2.583],
// 5 24 -13.961 -6.889 0 -10.798 -6.526 0 -13.841 -6.872 -2.803 -13.841 -6.872 2.803
  [5,24,-13.961,-6.889,0,-10.798,-6.526,0,-13.841,-6.872,-2.803,-13.841,-6.872,2.803],
// 5 24 -15.367 -7.483 0 -13.961 -6.889 0 -15.413 -7.541 2.583 -15.413 -7.541 -2.583
  [5,24,-15.367,-7.483,0,-13.961,-6.889,0,-15.413,-7.541,2.583,-15.413,-7.541,-2.583],
// 5 24 -4.6 -9.736 0 -17.465 -9.706 0 -17.662 -10.016 -1.838 -17.662 -10.016 1.838
  [5,24,-4.6,-9.736,0,-17.465,-9.706,0,-17.662,-10.016,-1.838,-17.662,-10.016,1.838],
// 5 24 -4.6 -10.253 0 4.6 -10.253 0 -4.6 -10.902 -1.989 -4.6 -10.902 1.989
  [5,24,-4.6,-10.253,0,4.6,-10.253,0,-4.6,-10.902,-1.989,-4.6,-10.902,1.989],
// 5 24 -17.465 -9.706 0 -16.679 -8.681 0 -17.662 -10.016 1.838 -17.662 -10.016 -1.838
  [5,24,-17.465,-9.706,0,-16.679,-8.681,0,-17.662,-10.016,1.838,-17.662,-10.016,-1.838],
// 5 24 0 -17.485 7.545 0 -18.602 4.643 5.963 -17.952 7.475 -5.963 -17.952 7.475
  [5,24,0,-17.485,7.545,0,-18.602,4.643,5.963,-17.952,7.475,-5.963,-17.952,7.475],
// 5 24 0 -18.602 -4.643 4.6 -18.292 -4.634 6.07 -19.1 -4.634 -4.6 -18.292 -4.634
  [5,24,0,-18.602,-4.643,4.6,-18.292,-4.634,6.07,-19.1,-4.634,-4.6,-18.292,-4.634],
// 5 24 -4.6 -10.902 -1.989 4.6 -10.902 -1.989 4.6 -10.253 0 -4.6 -11.89 -2.93
  [5,24,-4.6,-10.902,-1.989,4.6,-10.902,-1.989,4.6,-10.253,0,-4.6,-11.89,-2.93],
// 5 24 4.6 -14.79 4.1 -4.6 -14.79 4.1 -4.6 -13.27 3.8 4.6 -16.577 3.746
  [5,24,4.6,-14.79,4.1,-4.6,-14.79,4.1,-4.6,-13.27,3.8,4.6,-16.577,3.746],
// 5 24 4.6 -9.736 0 17.465 -9.706 0 17.662 -10.016 1.838 17.662 -10.016 -1.838
  [5,24,4.6,-9.736,0,17.465,-9.706,0,17.662,-10.016,1.838,17.662,-10.016,-1.838],
// 5 24 16.679 -8.681 0 15.367 -7.483 0 15.413 -7.541 -2.583 15.413 -7.541 2.583
  [5,24,16.679,-8.681,0,15.367,-7.483,0,15.413,-7.541,-2.583,15.413,-7.541,2.583],
// 5 24 4.6 -11.89 -2.93 -4.6 -11.89 -2.93 -4.6 -13.27 -3.8 4.6 -10.902 -1.989
  [5,24,4.6,-11.89,-2.93,-4.6,-11.89,-2.93,-4.6,-13.27,-3.8,4.6,-10.902,-1.989],
// 5 24 -4.6 -11.89 2.93 4.6 -11.89 2.93 -4.6 -10.902 1.989 4.6 -13.27 3.8
  [5,24,-4.6,-11.89,2.93,4.6,-11.89,2.93,-4.6,-10.902,1.989,4.6,-13.27,3.8],
// 5 24 4.6 -18.292 4.634 0 -18.602 4.643 6.07 -19.1 4.634 -4.6 -18.292 4.634
  [5,24,4.6,-18.292,4.634,0,-18.602,4.643,6.07,-19.1,4.634,-4.6,-18.292,4.634],
// 5 24 0 -12.471 -9.674 0 -15.436 -9.087 -5.918 -15.712 -9.123 5.918 -15.712 -9.123
  [5,24,0,-12.471,-9.674,0,-15.436,-9.087,-5.918,-15.712,-9.123,5.918,-15.712,-9.123],
// 5 24 -10.798 -6.526 0 -8 -6.5 0 -10.512 -6.591 3.236 -10.512 -6.591 -3.236
  [5,24,-10.798,-6.526,0,-8,-6.5,0,-10.512,-6.591,3.236,-10.512,-6.591,-3.236],
// 5 24 -4.6 -13.27 -3.8 4.6 -13.27 -3.8 -4.6 -14.79 -4.1 4.6 -11.89 -2.93
  [5,24,-4.6,-13.27,-3.8,4.6,-13.27,-3.8,-4.6,-14.79,-4.1,4.6,-11.89,-2.93],
// 5 24 17.465 -9.706 0 16.679 -8.681 0 17.662 -10.016 1.838 17.662 -10.016 -1.838
  [5,24,17.465,-9.706,0,16.679,-8.681,0,17.662,-10.016,1.838,17.662,-10.016,-1.838],
// 5 24 0 -8.953 -9.211 0 -12.471 -9.674 5.834 -12.661 -9.569 -5.834 -12.661 -9.569
  [5,24,0,-8.953,-9.211,0,-12.471,-9.674,5.834,-12.661,-9.569,-5.834,-12.661,-9.569],
// 5 24 0 -17.485 -7.545 0 -18.602 -4.643 -5.963 -17.952 -7.475 5.963 -17.952 -7.475
  [5,24,0,-17.485,-7.545,0,-18.602,-4.643,-5.963,-17.952,-7.475,5.963,-17.952,-7.475],
// 5 24 0 -15.436 9.087 0 -17.485 7.545 5.918 -15.712 9.123 -5.918 -15.712 9.123
  [5,24,0,-15.436,9.087,0,-17.485,7.545,5.918,-15.712,9.123,-5.918,-15.712,9.123],
// 5 24 13.961 -6.889 0 10.798 -6.526 0 13.841 -6.872 -2.803 13.841 -6.872 2.803
  [5,24,13.961,-6.889,0,10.798,-6.526,0,13.841,-6.872,-2.803,13.841,-6.872,2.803],
// 5 24 15.367 -7.483 0 13.961 -6.889 0 15.413 -7.541 2.583 15.413 -7.541 -2.583
  [5,24,15.367,-7.483,0,13.961,-6.889,0,15.413,-7.541,2.583,15.413,-7.541,-2.583],
// 5 24 0 -12.471 9.674 0 -15.436 9.087 5.918 -15.712 9.123 -5.918 -15.712 9.123
  [5,24,0,-12.471,9.674,0,-15.436,9.087,5.918,-15.712,9.123,-5.918,-15.712,9.123],
// 5 24 0 -6.5 -8 0 -8.953 -9.211 5.523 -8.932 -8.882 -5.523 -8.932 -8.882
  [5,24,0,-6.5,-8,0,-8.953,-9.211,5.523,-8.932,-8.882,-5.523,-8.932,-8.882],
// 5 24 10.798 -6.526 0 8 -6.5 0 10.512 -6.591 -3.236 10.512 -6.591 3.236
  [5,24,10.798,-6.526,0,8,-6.5,0,10.512,-6.591,-3.236,10.512,-6.591,3.236],
// 5 24 0 -6.5 8 0 -8.953 9.211 5.523 -8.932 8.882 -5.523 -8.932 8.882
  [5,24,0,-6.5,8,0,-8.953,9.211,5.523,-8.932,8.882,-5.523,-8.932,8.882],
// 5 24 4.6 -13.27 3.8 -4.6 -13.27 3.8 -4.6 -11.89 2.93 4.6 -14.79 4.1
  [5,24,4.6,-13.27,3.8,-4.6,-13.27,3.8,-4.6,-11.89,2.93,4.6,-14.79,4.1],
// 5 24 -4.6 -14.79 -4.1 4.6 -14.79 -4.1 -4.6 -16.577 -3.746 4.6 -13.27 -3.8
  [5,24,-4.6,-14.79,-4.1,4.6,-14.79,-4.1,-4.6,-16.577,-3.746,4.6,-13.27,-3.8],
// 5 24 0 -15.436 -9.087 0 -17.485 -7.545 -5.918 -15.712 -9.123 5.918 -15.712 -9.123
  [5,24,0,-15.436,-9.087,0,-17.485,-7.545,-5.918,-15.712,-9.123,5.918,-15.712,-9.123],
// 5 24 0 -18.602 -4.643 -4.6 -18.292 -4.634 4.6 -18.292 -4.634 -6.07 -19.1 -4.634
  [5,24,0,-18.602,-4.643,-4.6,-18.292,-4.634,4.6,-18.292,-4.634,-6.07,-19.1,-4.634],
// 5 24 4.6 -10.902 1.989 -4.6 -10.902 1.989 4.6 -11.89 2.93 4.6 -10.253 0
  [5,24,4.6,-10.902,1.989,-4.6,-10.902,1.989,4.6,-11.89,2.93,4.6,-10.253,0],
// 5 24 0 -18.602 4.643 -4.6 -18.292 4.634 -6.07 -19.1 4.634 4.6 -18.292 4.634
  [5,24,0,-18.602,4.643,-4.6,-18.292,4.634,-6.07,-19.1,4.634,4.6,-18.292,4.634],
// 5 24 0 -8.953 9.211 0 -12.471 9.674 5.834 -12.661 9.569 -5.834 -12.661 9.569
  [5,24,0,-8.953,9.211,0,-12.471,9.674,5.834,-12.661,9.569,-5.834,-12.661,9.569],
];
makepoly(ldraw_lib__25386(), line=0.2);
